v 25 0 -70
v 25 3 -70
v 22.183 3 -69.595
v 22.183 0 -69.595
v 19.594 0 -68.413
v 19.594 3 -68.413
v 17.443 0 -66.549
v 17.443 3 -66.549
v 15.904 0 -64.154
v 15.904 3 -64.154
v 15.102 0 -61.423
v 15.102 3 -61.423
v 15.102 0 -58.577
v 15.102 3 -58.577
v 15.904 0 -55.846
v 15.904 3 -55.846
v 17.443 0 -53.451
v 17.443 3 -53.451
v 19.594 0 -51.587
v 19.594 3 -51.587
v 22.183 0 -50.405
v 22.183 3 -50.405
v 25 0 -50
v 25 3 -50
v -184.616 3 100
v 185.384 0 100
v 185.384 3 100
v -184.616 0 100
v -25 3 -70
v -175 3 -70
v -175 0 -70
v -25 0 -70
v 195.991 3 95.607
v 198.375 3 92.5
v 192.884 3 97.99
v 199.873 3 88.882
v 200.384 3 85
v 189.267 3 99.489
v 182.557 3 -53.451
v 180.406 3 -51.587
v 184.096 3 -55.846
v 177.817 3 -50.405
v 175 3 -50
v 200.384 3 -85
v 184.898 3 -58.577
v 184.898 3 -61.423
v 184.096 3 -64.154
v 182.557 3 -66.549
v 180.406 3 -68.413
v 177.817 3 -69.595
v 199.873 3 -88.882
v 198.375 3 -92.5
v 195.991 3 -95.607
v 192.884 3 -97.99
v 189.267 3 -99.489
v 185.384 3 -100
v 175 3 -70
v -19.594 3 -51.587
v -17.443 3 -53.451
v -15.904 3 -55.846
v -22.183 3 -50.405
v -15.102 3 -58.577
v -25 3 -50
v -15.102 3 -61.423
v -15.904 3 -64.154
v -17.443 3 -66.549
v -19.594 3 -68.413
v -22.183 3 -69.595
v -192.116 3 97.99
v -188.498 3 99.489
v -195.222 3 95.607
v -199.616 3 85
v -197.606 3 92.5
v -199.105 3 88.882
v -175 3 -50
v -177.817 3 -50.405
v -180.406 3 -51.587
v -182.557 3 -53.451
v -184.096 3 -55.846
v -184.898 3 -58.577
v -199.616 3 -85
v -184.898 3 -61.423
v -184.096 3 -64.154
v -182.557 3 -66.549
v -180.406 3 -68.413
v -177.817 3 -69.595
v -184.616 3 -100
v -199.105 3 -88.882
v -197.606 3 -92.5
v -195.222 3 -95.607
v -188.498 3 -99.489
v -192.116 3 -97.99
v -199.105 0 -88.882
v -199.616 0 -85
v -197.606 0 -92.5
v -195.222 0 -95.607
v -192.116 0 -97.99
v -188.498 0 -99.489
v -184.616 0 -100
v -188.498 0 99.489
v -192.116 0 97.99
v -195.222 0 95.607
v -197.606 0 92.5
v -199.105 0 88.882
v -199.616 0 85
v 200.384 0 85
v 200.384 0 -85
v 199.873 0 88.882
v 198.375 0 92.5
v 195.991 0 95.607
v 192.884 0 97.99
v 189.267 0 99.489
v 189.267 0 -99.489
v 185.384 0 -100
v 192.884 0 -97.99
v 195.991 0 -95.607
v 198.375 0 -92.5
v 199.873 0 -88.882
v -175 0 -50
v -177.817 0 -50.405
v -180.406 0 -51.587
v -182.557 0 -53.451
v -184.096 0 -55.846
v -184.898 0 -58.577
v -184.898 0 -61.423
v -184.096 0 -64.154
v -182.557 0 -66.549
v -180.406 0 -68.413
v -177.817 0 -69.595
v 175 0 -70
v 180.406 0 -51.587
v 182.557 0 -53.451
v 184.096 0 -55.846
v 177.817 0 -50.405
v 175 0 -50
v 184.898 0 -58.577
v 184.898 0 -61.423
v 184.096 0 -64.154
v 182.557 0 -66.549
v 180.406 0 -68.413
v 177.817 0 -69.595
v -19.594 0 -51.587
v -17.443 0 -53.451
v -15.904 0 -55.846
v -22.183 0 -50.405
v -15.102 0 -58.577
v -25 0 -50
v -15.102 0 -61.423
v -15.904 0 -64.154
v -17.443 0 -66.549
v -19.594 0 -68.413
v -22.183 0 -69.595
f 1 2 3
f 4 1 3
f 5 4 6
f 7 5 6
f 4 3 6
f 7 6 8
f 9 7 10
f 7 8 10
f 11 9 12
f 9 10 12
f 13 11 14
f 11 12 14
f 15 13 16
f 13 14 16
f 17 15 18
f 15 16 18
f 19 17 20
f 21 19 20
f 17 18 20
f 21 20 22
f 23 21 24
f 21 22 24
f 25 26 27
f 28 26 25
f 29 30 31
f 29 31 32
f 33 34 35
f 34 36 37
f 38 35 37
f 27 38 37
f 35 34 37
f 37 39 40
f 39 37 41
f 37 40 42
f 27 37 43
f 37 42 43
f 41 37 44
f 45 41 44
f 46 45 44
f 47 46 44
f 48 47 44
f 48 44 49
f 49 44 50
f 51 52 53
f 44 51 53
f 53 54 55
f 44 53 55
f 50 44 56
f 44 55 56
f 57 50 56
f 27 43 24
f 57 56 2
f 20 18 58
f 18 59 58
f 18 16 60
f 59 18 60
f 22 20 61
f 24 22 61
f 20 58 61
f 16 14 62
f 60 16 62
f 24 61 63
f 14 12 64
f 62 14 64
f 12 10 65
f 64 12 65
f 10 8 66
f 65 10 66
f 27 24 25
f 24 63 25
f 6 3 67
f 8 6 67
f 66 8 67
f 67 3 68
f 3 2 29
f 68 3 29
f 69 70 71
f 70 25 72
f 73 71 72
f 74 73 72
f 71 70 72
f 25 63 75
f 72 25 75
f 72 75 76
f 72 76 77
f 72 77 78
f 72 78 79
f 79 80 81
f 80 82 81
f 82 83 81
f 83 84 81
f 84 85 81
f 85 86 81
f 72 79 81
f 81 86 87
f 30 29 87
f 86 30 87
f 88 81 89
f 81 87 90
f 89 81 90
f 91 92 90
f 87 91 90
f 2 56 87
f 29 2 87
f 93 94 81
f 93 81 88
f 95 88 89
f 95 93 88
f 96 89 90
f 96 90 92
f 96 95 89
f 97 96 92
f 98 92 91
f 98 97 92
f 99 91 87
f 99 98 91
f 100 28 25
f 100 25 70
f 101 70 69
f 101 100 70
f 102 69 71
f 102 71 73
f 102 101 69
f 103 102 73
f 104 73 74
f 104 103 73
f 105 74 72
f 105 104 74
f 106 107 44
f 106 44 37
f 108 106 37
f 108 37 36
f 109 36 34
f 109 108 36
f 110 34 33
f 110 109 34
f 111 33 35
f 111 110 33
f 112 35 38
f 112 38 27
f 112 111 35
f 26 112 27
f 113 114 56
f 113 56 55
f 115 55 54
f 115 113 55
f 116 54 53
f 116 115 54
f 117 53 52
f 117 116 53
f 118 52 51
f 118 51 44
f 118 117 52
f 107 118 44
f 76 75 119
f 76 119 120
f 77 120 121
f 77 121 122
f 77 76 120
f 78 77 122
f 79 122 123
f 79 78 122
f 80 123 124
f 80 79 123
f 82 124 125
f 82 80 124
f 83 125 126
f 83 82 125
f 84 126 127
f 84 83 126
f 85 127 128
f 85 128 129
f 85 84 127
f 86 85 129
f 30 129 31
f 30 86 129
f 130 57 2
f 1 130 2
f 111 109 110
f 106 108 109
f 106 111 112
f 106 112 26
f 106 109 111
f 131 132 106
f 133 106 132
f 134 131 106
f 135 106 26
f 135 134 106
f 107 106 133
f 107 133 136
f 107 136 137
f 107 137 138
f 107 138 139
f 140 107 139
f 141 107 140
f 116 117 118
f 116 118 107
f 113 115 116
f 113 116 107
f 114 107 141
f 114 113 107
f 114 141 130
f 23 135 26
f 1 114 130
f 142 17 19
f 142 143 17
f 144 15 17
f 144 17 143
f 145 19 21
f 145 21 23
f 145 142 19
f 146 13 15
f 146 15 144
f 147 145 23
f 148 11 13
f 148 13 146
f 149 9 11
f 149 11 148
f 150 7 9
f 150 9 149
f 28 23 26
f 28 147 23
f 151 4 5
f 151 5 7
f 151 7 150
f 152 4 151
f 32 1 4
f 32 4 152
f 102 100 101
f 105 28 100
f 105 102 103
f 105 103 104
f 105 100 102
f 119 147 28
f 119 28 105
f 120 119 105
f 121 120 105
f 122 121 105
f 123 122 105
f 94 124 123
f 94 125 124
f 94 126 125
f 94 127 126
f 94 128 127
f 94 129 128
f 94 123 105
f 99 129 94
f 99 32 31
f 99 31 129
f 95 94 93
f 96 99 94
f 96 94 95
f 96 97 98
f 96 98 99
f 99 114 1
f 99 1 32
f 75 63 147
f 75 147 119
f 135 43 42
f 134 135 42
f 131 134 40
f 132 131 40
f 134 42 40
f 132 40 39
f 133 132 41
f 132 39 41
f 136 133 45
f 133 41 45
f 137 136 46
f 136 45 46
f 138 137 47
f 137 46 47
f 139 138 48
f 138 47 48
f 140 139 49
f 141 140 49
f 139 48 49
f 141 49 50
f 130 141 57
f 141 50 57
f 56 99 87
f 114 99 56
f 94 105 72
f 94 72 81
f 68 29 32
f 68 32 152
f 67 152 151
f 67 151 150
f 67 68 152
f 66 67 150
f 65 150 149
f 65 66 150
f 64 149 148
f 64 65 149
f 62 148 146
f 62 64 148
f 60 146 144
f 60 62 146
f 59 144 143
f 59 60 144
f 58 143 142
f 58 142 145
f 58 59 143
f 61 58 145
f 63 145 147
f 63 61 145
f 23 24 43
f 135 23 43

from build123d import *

# Parameters (mm, degrees)
EXTRUDE_1_DEPTH     = 3
CUT_EXTRUDE_3_DEPTH = 3


with BuildPart() as part:
    # 草图1 → 凸台-拉伸1 (new body)
    with BuildSketch(Plane(origin=(0, 0, 0), x_dir=(1, 0, 0), z_dir=(0, 1, 0))):
        with BuildLine():
            Line((-184.615743852, 100), (185.384256148, 100))
            ThreePointArc((185.384256148, 100), (195.990857866, 95.606601718), (200.384256148, 85))
            Line((200.384256148, 85), (200.384256148, -85))
            ThreePointArc((200.384256148, -85), (195.990857866, -95.606601718), (185.384256148, -100))
            Line((185.384256148, -100), (-184.615743852, -100))
            ThreePointArc((-184.615743852, -100), (-195.22234557, -95.606601718), (-199.615743852, -85))
            Line((-199.615743852, -85), (-199.615743852, 85))
            ThreePointArc((-199.615743852, 85), (-195.22234557, 95.606601718), (-184.615743852, 100))
        make_face()
    extrude(amount=EXTRUDE_1_DEPTH)

    # 草图2 → 切除-拉伸3 (cut)
    with BuildSketch(Plane(origin=(0, 3, 0), x_dir=(1, 0, 0), z_dir=(0, 1, 0))):
        with BuildLine():
            Line((-175, 70), (-25, 70))
            ThreePointArc((-25, 70), (-15, 60), (-25, 50))
            Line((-25, 50), (-175, 50))
            ThreePointArc((-175, 50), (-185, 60), (-175, 70))
        make_face()
        with BuildLine():
            Line((25, 50), (175, 50))
            ThreePointArc((175, 50), (185, 60), (175, 70))
            Line((175, 70), (25, 70))
            ThreePointArc((25, 70), (15, 60), (25, 50))
        make_face()
    extrude(amount=-CUT_EXTRUDE_3_DEPTH, mode=Mode.SUBTRACT)


solid = part.part
